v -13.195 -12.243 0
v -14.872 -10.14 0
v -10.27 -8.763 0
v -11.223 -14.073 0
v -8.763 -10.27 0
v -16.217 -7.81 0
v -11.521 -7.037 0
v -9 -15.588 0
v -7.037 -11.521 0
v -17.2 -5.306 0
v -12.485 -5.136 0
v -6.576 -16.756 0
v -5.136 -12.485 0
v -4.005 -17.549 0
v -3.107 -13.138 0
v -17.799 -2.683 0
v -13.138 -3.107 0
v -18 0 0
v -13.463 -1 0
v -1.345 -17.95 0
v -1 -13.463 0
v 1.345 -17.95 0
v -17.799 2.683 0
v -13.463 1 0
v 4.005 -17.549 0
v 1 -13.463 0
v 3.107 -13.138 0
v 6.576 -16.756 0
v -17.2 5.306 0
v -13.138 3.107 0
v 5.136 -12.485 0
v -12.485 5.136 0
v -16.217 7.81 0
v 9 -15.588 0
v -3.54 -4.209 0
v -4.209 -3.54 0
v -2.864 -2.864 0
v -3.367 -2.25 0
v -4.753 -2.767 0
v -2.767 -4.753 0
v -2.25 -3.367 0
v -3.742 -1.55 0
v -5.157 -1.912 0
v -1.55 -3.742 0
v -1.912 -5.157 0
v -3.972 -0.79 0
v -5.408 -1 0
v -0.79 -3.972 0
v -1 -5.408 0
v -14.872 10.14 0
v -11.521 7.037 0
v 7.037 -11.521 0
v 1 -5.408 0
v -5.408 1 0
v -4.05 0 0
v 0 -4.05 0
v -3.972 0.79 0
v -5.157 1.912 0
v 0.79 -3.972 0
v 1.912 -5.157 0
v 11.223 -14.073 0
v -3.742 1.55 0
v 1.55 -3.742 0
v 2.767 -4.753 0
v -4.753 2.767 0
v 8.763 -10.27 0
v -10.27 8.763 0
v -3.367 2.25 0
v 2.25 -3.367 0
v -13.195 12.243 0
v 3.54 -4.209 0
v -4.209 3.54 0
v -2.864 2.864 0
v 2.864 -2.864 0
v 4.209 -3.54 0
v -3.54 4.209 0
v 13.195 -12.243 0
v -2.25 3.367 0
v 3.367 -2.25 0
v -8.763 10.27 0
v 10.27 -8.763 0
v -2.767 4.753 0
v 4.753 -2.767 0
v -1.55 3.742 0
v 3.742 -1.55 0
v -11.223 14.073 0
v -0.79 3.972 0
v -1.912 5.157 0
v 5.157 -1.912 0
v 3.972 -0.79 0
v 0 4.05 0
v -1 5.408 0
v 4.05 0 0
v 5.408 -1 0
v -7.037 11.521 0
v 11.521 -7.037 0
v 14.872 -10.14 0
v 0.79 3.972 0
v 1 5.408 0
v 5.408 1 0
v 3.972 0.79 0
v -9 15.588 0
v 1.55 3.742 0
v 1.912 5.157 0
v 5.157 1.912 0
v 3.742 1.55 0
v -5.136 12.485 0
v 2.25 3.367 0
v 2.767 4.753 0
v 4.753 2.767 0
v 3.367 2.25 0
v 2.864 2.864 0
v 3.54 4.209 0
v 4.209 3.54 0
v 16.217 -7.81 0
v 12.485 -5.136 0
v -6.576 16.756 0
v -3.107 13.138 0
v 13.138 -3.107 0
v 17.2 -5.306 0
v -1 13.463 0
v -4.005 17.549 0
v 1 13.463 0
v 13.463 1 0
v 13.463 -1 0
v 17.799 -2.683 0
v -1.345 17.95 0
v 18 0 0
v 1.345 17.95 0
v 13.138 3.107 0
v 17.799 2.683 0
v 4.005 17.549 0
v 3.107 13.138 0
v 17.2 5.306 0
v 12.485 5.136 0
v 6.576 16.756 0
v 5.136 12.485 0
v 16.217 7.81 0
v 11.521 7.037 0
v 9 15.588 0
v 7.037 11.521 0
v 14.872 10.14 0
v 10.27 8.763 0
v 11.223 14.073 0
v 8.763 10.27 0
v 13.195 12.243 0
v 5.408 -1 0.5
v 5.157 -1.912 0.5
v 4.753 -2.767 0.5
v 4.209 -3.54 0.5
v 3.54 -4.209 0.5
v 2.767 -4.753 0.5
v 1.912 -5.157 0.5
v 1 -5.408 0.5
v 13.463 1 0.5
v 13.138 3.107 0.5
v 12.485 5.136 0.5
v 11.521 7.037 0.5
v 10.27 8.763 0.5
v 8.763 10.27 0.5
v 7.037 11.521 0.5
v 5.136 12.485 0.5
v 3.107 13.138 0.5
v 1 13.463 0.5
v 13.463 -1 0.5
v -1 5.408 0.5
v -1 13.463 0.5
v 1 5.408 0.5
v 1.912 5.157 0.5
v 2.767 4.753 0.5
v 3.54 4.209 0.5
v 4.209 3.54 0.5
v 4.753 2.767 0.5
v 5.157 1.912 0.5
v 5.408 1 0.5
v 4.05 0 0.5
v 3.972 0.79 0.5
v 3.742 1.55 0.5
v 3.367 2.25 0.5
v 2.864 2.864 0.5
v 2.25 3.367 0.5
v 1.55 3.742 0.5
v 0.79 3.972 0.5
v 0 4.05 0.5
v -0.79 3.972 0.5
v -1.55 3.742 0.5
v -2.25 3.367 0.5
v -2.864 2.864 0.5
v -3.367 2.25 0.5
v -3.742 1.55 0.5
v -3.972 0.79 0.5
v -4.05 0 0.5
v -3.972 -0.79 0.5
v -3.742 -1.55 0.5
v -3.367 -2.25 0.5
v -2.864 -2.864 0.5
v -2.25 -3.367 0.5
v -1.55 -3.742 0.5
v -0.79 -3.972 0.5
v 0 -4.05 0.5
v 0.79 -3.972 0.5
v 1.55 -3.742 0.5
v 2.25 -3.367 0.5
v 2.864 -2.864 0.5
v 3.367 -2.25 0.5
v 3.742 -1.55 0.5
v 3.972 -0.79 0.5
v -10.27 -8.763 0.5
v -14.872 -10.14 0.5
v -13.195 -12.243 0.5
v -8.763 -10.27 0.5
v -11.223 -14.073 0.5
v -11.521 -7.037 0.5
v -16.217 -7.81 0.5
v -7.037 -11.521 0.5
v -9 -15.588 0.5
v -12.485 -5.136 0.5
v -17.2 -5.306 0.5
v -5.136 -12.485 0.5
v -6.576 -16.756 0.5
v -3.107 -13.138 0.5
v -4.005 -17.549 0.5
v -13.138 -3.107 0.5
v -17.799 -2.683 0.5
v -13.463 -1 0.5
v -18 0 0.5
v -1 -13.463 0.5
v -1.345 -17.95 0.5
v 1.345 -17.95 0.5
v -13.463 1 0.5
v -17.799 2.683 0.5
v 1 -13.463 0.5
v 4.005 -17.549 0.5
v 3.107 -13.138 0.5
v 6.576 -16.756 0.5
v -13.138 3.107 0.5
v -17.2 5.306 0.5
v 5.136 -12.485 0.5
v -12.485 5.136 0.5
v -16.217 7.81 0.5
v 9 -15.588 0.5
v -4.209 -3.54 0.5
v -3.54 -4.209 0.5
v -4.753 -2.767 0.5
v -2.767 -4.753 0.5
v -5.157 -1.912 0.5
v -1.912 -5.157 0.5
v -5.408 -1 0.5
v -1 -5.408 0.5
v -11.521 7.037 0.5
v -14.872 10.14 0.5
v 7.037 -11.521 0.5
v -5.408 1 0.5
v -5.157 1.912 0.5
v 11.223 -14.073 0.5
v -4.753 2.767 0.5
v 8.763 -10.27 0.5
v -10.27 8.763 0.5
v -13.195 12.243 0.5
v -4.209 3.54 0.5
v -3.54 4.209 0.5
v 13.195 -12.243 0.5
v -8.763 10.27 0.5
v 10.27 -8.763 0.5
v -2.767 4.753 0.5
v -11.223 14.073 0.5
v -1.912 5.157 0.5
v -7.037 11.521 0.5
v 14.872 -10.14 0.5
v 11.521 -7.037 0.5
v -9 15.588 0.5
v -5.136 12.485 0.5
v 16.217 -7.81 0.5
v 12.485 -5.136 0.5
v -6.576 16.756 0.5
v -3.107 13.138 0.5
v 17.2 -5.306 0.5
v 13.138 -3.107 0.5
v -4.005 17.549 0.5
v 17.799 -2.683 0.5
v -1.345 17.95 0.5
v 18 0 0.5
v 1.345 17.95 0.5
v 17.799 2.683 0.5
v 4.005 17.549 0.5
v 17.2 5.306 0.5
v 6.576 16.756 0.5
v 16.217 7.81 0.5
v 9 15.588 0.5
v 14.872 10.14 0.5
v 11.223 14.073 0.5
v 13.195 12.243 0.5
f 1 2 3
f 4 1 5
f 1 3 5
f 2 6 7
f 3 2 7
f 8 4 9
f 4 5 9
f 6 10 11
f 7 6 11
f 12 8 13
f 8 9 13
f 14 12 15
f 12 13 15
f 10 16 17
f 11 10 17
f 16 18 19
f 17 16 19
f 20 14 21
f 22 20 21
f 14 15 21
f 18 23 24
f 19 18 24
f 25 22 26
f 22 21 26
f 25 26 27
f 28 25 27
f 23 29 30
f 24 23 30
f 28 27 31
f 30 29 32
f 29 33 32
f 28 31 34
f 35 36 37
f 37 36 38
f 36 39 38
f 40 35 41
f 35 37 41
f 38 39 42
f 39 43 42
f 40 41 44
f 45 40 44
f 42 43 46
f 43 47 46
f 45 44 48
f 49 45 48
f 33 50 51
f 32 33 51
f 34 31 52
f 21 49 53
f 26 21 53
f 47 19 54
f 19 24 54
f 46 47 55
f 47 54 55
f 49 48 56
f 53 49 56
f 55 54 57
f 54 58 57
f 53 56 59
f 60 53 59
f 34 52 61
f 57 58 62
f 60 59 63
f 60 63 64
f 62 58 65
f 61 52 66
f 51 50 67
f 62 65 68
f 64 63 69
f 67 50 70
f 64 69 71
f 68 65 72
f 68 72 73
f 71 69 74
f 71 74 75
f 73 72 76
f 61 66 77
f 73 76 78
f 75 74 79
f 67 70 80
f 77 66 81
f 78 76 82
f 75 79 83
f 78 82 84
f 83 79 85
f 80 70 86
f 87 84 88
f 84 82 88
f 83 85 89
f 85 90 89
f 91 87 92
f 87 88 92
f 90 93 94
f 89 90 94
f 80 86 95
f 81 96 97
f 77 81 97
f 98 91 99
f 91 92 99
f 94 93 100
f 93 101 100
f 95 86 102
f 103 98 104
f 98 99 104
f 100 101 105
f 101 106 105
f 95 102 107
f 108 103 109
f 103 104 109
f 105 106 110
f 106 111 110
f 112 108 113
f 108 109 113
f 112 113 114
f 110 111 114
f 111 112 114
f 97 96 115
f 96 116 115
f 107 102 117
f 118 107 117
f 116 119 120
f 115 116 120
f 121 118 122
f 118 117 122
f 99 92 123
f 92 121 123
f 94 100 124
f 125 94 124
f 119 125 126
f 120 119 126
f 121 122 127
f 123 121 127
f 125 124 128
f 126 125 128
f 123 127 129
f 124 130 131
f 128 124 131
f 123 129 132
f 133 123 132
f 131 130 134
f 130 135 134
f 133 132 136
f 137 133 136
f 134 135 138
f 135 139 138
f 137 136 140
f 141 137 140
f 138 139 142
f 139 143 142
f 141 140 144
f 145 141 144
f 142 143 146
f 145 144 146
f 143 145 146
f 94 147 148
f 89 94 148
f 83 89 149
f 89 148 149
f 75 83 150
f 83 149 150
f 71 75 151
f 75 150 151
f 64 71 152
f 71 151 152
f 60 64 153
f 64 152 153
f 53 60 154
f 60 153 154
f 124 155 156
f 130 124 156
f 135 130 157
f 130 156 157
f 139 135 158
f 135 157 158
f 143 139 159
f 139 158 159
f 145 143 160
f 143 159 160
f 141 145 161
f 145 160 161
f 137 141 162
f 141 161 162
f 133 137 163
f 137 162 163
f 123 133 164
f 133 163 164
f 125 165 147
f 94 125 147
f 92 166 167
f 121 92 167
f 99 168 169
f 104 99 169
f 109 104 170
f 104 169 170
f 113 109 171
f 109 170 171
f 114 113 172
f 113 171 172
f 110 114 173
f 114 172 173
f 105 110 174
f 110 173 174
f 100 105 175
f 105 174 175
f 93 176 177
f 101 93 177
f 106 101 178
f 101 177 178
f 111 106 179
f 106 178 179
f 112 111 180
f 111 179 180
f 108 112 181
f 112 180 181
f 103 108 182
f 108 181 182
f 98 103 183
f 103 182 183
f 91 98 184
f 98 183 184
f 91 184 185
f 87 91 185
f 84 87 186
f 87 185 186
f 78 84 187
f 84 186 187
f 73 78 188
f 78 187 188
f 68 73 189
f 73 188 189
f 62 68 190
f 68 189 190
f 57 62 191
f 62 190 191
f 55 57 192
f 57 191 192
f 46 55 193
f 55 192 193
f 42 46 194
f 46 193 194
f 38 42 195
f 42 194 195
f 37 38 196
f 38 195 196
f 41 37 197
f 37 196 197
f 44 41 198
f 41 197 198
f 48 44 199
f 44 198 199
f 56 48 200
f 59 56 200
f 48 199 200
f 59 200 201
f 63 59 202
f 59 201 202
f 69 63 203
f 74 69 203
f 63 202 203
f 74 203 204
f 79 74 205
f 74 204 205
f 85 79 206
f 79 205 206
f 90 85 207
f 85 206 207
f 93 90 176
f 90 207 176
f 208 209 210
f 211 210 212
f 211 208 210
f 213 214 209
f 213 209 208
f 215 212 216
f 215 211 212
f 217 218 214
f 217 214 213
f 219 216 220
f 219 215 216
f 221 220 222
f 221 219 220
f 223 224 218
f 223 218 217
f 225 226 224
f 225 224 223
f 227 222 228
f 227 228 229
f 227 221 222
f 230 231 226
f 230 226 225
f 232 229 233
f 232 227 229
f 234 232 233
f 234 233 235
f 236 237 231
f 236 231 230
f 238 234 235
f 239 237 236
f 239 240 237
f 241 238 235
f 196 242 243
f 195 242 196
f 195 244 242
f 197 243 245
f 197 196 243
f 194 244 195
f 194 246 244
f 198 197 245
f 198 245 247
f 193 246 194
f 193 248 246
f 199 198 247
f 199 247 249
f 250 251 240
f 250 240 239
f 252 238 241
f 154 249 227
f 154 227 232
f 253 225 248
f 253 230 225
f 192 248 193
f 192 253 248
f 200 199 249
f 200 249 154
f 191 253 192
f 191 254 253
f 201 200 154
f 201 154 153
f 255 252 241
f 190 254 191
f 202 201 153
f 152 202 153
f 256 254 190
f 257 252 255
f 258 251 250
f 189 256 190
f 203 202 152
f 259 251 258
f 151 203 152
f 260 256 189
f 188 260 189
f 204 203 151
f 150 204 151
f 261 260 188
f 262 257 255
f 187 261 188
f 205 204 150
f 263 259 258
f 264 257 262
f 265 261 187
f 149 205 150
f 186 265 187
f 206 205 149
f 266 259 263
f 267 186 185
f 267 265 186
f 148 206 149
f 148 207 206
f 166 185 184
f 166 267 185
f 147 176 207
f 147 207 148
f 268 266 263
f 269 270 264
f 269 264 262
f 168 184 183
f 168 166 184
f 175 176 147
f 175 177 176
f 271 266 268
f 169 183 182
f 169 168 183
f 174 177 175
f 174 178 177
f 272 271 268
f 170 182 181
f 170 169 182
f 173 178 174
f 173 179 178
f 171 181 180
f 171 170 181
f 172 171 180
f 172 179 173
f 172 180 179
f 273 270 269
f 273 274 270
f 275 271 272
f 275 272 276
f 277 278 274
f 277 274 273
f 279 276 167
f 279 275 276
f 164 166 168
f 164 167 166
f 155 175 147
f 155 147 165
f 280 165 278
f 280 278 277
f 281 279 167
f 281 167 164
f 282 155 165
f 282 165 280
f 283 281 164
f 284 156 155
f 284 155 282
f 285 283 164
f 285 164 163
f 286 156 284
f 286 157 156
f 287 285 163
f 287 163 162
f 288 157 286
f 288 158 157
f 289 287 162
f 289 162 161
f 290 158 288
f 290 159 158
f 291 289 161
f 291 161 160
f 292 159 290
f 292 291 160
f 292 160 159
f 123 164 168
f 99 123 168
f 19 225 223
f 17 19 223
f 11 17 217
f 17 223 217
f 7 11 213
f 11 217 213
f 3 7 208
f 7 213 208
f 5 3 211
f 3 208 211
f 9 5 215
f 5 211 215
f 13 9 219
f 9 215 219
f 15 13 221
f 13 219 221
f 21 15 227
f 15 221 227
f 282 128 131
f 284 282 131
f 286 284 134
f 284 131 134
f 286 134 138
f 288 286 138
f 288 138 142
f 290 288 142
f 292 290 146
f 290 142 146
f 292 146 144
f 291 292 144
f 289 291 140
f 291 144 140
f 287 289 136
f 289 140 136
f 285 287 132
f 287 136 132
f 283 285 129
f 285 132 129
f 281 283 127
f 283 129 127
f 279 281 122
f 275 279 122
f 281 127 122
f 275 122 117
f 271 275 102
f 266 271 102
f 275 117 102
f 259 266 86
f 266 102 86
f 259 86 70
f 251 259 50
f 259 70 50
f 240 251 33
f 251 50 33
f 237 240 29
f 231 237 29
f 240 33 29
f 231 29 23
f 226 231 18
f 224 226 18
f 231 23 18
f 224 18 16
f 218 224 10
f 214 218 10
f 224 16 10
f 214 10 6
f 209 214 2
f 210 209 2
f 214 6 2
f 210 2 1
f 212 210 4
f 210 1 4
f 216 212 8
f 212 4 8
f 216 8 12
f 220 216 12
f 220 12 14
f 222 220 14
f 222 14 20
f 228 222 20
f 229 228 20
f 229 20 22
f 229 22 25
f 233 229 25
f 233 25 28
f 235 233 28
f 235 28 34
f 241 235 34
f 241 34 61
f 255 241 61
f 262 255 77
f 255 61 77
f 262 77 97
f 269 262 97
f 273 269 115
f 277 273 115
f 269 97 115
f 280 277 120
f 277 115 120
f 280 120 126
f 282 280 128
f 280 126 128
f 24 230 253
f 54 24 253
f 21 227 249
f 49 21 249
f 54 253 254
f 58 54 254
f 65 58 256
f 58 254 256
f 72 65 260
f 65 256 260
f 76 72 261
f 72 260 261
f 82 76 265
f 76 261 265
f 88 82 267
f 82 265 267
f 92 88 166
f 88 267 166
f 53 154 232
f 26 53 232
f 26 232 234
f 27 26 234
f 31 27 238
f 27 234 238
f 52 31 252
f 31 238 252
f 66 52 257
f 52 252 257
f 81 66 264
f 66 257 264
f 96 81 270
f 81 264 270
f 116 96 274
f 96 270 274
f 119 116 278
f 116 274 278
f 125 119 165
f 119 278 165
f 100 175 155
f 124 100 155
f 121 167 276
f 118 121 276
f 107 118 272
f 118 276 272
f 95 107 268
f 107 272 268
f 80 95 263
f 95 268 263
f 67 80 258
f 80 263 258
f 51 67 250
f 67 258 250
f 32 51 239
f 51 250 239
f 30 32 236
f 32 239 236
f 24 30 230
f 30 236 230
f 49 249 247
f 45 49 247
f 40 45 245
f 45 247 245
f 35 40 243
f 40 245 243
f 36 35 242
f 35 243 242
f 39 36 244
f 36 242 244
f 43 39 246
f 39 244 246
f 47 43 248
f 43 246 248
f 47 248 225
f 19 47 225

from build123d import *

# Parameters (mm, degrees)
F0_R     = 18
F1_DEPTH = 0.5
F2_R     = 4.05
F3_DEPTH = 0.5
F5_DEPTH = 0.5


with BuildPart() as f1:
    # F0 (on Top) → F1 (new body)
    with BuildSketch(Plane.XY):
        Circle(F0_R)
    extrude(amount=F1_DEPTH)

    # F2 (on face) → F3 (cut, through all)
    with BuildSketch(Plane.XY.offset(0.5)):
        Circle(F2_R)
    extrude(amount=-F3_DEPTH, mode=Mode.SUBTRACT)

    # F4 (on face) → F5 (cut, through all)
    with BuildSketch(Plane.XY.offset(0.5)):
        with BuildLine():
            Line((-1, -13.462912), (-1, -5.408327))
            ThreePointArc((-1, -5.408327), (-3.889087, -3.889087), (-5.408327, -1))
            Line((-5.408327, -1), (-13.462912, -1))
            ThreePointArc((-13.462912, -1), (-9.545942, -9.545942), (-1, -13.462912))
        make_face()
        with BuildLine():
            Line((13.462912, -1), (5.408327, -1))
            ThreePointArc((5.408327, -1), (3.889087, -3.889087), (1, -5.408327))
            Line((1, -5.408327), (1, -13.462912))
            ThreePointArc((1, -13.462912), (9.545942, -9.545942), (13.462912, -1))
        make_face()
        with BuildLine():
            ThreePointArc((1, 5.408327), (3.889087, 3.889087), (5.408327, 1))
            Line((5.408327, 1), (13.462912, 1))
            ThreePointArc((13.462912, 1), (9.545942, 9.545942), (1, 13.462912))
            Line((1, 13.462912), (1, 5.408327))
        make_face()
        with BuildLine():
            ThreePointArc((-5.408327, 1), (-3.889087, 3.889087), (-1, 5.408327))
            Line((-1, 5.408327), (-1, 13.462912))
            ThreePointArc((-1, 13.462912), (-9.545942, 9.545942), (-13.462912, 1))
            Line((-13.462912, 1), (-5.408327, 1))
        make_face()
    extrude(amount=-F5_DEPTH, mode=Mode.SUBTRACT)


solid = f1.part
